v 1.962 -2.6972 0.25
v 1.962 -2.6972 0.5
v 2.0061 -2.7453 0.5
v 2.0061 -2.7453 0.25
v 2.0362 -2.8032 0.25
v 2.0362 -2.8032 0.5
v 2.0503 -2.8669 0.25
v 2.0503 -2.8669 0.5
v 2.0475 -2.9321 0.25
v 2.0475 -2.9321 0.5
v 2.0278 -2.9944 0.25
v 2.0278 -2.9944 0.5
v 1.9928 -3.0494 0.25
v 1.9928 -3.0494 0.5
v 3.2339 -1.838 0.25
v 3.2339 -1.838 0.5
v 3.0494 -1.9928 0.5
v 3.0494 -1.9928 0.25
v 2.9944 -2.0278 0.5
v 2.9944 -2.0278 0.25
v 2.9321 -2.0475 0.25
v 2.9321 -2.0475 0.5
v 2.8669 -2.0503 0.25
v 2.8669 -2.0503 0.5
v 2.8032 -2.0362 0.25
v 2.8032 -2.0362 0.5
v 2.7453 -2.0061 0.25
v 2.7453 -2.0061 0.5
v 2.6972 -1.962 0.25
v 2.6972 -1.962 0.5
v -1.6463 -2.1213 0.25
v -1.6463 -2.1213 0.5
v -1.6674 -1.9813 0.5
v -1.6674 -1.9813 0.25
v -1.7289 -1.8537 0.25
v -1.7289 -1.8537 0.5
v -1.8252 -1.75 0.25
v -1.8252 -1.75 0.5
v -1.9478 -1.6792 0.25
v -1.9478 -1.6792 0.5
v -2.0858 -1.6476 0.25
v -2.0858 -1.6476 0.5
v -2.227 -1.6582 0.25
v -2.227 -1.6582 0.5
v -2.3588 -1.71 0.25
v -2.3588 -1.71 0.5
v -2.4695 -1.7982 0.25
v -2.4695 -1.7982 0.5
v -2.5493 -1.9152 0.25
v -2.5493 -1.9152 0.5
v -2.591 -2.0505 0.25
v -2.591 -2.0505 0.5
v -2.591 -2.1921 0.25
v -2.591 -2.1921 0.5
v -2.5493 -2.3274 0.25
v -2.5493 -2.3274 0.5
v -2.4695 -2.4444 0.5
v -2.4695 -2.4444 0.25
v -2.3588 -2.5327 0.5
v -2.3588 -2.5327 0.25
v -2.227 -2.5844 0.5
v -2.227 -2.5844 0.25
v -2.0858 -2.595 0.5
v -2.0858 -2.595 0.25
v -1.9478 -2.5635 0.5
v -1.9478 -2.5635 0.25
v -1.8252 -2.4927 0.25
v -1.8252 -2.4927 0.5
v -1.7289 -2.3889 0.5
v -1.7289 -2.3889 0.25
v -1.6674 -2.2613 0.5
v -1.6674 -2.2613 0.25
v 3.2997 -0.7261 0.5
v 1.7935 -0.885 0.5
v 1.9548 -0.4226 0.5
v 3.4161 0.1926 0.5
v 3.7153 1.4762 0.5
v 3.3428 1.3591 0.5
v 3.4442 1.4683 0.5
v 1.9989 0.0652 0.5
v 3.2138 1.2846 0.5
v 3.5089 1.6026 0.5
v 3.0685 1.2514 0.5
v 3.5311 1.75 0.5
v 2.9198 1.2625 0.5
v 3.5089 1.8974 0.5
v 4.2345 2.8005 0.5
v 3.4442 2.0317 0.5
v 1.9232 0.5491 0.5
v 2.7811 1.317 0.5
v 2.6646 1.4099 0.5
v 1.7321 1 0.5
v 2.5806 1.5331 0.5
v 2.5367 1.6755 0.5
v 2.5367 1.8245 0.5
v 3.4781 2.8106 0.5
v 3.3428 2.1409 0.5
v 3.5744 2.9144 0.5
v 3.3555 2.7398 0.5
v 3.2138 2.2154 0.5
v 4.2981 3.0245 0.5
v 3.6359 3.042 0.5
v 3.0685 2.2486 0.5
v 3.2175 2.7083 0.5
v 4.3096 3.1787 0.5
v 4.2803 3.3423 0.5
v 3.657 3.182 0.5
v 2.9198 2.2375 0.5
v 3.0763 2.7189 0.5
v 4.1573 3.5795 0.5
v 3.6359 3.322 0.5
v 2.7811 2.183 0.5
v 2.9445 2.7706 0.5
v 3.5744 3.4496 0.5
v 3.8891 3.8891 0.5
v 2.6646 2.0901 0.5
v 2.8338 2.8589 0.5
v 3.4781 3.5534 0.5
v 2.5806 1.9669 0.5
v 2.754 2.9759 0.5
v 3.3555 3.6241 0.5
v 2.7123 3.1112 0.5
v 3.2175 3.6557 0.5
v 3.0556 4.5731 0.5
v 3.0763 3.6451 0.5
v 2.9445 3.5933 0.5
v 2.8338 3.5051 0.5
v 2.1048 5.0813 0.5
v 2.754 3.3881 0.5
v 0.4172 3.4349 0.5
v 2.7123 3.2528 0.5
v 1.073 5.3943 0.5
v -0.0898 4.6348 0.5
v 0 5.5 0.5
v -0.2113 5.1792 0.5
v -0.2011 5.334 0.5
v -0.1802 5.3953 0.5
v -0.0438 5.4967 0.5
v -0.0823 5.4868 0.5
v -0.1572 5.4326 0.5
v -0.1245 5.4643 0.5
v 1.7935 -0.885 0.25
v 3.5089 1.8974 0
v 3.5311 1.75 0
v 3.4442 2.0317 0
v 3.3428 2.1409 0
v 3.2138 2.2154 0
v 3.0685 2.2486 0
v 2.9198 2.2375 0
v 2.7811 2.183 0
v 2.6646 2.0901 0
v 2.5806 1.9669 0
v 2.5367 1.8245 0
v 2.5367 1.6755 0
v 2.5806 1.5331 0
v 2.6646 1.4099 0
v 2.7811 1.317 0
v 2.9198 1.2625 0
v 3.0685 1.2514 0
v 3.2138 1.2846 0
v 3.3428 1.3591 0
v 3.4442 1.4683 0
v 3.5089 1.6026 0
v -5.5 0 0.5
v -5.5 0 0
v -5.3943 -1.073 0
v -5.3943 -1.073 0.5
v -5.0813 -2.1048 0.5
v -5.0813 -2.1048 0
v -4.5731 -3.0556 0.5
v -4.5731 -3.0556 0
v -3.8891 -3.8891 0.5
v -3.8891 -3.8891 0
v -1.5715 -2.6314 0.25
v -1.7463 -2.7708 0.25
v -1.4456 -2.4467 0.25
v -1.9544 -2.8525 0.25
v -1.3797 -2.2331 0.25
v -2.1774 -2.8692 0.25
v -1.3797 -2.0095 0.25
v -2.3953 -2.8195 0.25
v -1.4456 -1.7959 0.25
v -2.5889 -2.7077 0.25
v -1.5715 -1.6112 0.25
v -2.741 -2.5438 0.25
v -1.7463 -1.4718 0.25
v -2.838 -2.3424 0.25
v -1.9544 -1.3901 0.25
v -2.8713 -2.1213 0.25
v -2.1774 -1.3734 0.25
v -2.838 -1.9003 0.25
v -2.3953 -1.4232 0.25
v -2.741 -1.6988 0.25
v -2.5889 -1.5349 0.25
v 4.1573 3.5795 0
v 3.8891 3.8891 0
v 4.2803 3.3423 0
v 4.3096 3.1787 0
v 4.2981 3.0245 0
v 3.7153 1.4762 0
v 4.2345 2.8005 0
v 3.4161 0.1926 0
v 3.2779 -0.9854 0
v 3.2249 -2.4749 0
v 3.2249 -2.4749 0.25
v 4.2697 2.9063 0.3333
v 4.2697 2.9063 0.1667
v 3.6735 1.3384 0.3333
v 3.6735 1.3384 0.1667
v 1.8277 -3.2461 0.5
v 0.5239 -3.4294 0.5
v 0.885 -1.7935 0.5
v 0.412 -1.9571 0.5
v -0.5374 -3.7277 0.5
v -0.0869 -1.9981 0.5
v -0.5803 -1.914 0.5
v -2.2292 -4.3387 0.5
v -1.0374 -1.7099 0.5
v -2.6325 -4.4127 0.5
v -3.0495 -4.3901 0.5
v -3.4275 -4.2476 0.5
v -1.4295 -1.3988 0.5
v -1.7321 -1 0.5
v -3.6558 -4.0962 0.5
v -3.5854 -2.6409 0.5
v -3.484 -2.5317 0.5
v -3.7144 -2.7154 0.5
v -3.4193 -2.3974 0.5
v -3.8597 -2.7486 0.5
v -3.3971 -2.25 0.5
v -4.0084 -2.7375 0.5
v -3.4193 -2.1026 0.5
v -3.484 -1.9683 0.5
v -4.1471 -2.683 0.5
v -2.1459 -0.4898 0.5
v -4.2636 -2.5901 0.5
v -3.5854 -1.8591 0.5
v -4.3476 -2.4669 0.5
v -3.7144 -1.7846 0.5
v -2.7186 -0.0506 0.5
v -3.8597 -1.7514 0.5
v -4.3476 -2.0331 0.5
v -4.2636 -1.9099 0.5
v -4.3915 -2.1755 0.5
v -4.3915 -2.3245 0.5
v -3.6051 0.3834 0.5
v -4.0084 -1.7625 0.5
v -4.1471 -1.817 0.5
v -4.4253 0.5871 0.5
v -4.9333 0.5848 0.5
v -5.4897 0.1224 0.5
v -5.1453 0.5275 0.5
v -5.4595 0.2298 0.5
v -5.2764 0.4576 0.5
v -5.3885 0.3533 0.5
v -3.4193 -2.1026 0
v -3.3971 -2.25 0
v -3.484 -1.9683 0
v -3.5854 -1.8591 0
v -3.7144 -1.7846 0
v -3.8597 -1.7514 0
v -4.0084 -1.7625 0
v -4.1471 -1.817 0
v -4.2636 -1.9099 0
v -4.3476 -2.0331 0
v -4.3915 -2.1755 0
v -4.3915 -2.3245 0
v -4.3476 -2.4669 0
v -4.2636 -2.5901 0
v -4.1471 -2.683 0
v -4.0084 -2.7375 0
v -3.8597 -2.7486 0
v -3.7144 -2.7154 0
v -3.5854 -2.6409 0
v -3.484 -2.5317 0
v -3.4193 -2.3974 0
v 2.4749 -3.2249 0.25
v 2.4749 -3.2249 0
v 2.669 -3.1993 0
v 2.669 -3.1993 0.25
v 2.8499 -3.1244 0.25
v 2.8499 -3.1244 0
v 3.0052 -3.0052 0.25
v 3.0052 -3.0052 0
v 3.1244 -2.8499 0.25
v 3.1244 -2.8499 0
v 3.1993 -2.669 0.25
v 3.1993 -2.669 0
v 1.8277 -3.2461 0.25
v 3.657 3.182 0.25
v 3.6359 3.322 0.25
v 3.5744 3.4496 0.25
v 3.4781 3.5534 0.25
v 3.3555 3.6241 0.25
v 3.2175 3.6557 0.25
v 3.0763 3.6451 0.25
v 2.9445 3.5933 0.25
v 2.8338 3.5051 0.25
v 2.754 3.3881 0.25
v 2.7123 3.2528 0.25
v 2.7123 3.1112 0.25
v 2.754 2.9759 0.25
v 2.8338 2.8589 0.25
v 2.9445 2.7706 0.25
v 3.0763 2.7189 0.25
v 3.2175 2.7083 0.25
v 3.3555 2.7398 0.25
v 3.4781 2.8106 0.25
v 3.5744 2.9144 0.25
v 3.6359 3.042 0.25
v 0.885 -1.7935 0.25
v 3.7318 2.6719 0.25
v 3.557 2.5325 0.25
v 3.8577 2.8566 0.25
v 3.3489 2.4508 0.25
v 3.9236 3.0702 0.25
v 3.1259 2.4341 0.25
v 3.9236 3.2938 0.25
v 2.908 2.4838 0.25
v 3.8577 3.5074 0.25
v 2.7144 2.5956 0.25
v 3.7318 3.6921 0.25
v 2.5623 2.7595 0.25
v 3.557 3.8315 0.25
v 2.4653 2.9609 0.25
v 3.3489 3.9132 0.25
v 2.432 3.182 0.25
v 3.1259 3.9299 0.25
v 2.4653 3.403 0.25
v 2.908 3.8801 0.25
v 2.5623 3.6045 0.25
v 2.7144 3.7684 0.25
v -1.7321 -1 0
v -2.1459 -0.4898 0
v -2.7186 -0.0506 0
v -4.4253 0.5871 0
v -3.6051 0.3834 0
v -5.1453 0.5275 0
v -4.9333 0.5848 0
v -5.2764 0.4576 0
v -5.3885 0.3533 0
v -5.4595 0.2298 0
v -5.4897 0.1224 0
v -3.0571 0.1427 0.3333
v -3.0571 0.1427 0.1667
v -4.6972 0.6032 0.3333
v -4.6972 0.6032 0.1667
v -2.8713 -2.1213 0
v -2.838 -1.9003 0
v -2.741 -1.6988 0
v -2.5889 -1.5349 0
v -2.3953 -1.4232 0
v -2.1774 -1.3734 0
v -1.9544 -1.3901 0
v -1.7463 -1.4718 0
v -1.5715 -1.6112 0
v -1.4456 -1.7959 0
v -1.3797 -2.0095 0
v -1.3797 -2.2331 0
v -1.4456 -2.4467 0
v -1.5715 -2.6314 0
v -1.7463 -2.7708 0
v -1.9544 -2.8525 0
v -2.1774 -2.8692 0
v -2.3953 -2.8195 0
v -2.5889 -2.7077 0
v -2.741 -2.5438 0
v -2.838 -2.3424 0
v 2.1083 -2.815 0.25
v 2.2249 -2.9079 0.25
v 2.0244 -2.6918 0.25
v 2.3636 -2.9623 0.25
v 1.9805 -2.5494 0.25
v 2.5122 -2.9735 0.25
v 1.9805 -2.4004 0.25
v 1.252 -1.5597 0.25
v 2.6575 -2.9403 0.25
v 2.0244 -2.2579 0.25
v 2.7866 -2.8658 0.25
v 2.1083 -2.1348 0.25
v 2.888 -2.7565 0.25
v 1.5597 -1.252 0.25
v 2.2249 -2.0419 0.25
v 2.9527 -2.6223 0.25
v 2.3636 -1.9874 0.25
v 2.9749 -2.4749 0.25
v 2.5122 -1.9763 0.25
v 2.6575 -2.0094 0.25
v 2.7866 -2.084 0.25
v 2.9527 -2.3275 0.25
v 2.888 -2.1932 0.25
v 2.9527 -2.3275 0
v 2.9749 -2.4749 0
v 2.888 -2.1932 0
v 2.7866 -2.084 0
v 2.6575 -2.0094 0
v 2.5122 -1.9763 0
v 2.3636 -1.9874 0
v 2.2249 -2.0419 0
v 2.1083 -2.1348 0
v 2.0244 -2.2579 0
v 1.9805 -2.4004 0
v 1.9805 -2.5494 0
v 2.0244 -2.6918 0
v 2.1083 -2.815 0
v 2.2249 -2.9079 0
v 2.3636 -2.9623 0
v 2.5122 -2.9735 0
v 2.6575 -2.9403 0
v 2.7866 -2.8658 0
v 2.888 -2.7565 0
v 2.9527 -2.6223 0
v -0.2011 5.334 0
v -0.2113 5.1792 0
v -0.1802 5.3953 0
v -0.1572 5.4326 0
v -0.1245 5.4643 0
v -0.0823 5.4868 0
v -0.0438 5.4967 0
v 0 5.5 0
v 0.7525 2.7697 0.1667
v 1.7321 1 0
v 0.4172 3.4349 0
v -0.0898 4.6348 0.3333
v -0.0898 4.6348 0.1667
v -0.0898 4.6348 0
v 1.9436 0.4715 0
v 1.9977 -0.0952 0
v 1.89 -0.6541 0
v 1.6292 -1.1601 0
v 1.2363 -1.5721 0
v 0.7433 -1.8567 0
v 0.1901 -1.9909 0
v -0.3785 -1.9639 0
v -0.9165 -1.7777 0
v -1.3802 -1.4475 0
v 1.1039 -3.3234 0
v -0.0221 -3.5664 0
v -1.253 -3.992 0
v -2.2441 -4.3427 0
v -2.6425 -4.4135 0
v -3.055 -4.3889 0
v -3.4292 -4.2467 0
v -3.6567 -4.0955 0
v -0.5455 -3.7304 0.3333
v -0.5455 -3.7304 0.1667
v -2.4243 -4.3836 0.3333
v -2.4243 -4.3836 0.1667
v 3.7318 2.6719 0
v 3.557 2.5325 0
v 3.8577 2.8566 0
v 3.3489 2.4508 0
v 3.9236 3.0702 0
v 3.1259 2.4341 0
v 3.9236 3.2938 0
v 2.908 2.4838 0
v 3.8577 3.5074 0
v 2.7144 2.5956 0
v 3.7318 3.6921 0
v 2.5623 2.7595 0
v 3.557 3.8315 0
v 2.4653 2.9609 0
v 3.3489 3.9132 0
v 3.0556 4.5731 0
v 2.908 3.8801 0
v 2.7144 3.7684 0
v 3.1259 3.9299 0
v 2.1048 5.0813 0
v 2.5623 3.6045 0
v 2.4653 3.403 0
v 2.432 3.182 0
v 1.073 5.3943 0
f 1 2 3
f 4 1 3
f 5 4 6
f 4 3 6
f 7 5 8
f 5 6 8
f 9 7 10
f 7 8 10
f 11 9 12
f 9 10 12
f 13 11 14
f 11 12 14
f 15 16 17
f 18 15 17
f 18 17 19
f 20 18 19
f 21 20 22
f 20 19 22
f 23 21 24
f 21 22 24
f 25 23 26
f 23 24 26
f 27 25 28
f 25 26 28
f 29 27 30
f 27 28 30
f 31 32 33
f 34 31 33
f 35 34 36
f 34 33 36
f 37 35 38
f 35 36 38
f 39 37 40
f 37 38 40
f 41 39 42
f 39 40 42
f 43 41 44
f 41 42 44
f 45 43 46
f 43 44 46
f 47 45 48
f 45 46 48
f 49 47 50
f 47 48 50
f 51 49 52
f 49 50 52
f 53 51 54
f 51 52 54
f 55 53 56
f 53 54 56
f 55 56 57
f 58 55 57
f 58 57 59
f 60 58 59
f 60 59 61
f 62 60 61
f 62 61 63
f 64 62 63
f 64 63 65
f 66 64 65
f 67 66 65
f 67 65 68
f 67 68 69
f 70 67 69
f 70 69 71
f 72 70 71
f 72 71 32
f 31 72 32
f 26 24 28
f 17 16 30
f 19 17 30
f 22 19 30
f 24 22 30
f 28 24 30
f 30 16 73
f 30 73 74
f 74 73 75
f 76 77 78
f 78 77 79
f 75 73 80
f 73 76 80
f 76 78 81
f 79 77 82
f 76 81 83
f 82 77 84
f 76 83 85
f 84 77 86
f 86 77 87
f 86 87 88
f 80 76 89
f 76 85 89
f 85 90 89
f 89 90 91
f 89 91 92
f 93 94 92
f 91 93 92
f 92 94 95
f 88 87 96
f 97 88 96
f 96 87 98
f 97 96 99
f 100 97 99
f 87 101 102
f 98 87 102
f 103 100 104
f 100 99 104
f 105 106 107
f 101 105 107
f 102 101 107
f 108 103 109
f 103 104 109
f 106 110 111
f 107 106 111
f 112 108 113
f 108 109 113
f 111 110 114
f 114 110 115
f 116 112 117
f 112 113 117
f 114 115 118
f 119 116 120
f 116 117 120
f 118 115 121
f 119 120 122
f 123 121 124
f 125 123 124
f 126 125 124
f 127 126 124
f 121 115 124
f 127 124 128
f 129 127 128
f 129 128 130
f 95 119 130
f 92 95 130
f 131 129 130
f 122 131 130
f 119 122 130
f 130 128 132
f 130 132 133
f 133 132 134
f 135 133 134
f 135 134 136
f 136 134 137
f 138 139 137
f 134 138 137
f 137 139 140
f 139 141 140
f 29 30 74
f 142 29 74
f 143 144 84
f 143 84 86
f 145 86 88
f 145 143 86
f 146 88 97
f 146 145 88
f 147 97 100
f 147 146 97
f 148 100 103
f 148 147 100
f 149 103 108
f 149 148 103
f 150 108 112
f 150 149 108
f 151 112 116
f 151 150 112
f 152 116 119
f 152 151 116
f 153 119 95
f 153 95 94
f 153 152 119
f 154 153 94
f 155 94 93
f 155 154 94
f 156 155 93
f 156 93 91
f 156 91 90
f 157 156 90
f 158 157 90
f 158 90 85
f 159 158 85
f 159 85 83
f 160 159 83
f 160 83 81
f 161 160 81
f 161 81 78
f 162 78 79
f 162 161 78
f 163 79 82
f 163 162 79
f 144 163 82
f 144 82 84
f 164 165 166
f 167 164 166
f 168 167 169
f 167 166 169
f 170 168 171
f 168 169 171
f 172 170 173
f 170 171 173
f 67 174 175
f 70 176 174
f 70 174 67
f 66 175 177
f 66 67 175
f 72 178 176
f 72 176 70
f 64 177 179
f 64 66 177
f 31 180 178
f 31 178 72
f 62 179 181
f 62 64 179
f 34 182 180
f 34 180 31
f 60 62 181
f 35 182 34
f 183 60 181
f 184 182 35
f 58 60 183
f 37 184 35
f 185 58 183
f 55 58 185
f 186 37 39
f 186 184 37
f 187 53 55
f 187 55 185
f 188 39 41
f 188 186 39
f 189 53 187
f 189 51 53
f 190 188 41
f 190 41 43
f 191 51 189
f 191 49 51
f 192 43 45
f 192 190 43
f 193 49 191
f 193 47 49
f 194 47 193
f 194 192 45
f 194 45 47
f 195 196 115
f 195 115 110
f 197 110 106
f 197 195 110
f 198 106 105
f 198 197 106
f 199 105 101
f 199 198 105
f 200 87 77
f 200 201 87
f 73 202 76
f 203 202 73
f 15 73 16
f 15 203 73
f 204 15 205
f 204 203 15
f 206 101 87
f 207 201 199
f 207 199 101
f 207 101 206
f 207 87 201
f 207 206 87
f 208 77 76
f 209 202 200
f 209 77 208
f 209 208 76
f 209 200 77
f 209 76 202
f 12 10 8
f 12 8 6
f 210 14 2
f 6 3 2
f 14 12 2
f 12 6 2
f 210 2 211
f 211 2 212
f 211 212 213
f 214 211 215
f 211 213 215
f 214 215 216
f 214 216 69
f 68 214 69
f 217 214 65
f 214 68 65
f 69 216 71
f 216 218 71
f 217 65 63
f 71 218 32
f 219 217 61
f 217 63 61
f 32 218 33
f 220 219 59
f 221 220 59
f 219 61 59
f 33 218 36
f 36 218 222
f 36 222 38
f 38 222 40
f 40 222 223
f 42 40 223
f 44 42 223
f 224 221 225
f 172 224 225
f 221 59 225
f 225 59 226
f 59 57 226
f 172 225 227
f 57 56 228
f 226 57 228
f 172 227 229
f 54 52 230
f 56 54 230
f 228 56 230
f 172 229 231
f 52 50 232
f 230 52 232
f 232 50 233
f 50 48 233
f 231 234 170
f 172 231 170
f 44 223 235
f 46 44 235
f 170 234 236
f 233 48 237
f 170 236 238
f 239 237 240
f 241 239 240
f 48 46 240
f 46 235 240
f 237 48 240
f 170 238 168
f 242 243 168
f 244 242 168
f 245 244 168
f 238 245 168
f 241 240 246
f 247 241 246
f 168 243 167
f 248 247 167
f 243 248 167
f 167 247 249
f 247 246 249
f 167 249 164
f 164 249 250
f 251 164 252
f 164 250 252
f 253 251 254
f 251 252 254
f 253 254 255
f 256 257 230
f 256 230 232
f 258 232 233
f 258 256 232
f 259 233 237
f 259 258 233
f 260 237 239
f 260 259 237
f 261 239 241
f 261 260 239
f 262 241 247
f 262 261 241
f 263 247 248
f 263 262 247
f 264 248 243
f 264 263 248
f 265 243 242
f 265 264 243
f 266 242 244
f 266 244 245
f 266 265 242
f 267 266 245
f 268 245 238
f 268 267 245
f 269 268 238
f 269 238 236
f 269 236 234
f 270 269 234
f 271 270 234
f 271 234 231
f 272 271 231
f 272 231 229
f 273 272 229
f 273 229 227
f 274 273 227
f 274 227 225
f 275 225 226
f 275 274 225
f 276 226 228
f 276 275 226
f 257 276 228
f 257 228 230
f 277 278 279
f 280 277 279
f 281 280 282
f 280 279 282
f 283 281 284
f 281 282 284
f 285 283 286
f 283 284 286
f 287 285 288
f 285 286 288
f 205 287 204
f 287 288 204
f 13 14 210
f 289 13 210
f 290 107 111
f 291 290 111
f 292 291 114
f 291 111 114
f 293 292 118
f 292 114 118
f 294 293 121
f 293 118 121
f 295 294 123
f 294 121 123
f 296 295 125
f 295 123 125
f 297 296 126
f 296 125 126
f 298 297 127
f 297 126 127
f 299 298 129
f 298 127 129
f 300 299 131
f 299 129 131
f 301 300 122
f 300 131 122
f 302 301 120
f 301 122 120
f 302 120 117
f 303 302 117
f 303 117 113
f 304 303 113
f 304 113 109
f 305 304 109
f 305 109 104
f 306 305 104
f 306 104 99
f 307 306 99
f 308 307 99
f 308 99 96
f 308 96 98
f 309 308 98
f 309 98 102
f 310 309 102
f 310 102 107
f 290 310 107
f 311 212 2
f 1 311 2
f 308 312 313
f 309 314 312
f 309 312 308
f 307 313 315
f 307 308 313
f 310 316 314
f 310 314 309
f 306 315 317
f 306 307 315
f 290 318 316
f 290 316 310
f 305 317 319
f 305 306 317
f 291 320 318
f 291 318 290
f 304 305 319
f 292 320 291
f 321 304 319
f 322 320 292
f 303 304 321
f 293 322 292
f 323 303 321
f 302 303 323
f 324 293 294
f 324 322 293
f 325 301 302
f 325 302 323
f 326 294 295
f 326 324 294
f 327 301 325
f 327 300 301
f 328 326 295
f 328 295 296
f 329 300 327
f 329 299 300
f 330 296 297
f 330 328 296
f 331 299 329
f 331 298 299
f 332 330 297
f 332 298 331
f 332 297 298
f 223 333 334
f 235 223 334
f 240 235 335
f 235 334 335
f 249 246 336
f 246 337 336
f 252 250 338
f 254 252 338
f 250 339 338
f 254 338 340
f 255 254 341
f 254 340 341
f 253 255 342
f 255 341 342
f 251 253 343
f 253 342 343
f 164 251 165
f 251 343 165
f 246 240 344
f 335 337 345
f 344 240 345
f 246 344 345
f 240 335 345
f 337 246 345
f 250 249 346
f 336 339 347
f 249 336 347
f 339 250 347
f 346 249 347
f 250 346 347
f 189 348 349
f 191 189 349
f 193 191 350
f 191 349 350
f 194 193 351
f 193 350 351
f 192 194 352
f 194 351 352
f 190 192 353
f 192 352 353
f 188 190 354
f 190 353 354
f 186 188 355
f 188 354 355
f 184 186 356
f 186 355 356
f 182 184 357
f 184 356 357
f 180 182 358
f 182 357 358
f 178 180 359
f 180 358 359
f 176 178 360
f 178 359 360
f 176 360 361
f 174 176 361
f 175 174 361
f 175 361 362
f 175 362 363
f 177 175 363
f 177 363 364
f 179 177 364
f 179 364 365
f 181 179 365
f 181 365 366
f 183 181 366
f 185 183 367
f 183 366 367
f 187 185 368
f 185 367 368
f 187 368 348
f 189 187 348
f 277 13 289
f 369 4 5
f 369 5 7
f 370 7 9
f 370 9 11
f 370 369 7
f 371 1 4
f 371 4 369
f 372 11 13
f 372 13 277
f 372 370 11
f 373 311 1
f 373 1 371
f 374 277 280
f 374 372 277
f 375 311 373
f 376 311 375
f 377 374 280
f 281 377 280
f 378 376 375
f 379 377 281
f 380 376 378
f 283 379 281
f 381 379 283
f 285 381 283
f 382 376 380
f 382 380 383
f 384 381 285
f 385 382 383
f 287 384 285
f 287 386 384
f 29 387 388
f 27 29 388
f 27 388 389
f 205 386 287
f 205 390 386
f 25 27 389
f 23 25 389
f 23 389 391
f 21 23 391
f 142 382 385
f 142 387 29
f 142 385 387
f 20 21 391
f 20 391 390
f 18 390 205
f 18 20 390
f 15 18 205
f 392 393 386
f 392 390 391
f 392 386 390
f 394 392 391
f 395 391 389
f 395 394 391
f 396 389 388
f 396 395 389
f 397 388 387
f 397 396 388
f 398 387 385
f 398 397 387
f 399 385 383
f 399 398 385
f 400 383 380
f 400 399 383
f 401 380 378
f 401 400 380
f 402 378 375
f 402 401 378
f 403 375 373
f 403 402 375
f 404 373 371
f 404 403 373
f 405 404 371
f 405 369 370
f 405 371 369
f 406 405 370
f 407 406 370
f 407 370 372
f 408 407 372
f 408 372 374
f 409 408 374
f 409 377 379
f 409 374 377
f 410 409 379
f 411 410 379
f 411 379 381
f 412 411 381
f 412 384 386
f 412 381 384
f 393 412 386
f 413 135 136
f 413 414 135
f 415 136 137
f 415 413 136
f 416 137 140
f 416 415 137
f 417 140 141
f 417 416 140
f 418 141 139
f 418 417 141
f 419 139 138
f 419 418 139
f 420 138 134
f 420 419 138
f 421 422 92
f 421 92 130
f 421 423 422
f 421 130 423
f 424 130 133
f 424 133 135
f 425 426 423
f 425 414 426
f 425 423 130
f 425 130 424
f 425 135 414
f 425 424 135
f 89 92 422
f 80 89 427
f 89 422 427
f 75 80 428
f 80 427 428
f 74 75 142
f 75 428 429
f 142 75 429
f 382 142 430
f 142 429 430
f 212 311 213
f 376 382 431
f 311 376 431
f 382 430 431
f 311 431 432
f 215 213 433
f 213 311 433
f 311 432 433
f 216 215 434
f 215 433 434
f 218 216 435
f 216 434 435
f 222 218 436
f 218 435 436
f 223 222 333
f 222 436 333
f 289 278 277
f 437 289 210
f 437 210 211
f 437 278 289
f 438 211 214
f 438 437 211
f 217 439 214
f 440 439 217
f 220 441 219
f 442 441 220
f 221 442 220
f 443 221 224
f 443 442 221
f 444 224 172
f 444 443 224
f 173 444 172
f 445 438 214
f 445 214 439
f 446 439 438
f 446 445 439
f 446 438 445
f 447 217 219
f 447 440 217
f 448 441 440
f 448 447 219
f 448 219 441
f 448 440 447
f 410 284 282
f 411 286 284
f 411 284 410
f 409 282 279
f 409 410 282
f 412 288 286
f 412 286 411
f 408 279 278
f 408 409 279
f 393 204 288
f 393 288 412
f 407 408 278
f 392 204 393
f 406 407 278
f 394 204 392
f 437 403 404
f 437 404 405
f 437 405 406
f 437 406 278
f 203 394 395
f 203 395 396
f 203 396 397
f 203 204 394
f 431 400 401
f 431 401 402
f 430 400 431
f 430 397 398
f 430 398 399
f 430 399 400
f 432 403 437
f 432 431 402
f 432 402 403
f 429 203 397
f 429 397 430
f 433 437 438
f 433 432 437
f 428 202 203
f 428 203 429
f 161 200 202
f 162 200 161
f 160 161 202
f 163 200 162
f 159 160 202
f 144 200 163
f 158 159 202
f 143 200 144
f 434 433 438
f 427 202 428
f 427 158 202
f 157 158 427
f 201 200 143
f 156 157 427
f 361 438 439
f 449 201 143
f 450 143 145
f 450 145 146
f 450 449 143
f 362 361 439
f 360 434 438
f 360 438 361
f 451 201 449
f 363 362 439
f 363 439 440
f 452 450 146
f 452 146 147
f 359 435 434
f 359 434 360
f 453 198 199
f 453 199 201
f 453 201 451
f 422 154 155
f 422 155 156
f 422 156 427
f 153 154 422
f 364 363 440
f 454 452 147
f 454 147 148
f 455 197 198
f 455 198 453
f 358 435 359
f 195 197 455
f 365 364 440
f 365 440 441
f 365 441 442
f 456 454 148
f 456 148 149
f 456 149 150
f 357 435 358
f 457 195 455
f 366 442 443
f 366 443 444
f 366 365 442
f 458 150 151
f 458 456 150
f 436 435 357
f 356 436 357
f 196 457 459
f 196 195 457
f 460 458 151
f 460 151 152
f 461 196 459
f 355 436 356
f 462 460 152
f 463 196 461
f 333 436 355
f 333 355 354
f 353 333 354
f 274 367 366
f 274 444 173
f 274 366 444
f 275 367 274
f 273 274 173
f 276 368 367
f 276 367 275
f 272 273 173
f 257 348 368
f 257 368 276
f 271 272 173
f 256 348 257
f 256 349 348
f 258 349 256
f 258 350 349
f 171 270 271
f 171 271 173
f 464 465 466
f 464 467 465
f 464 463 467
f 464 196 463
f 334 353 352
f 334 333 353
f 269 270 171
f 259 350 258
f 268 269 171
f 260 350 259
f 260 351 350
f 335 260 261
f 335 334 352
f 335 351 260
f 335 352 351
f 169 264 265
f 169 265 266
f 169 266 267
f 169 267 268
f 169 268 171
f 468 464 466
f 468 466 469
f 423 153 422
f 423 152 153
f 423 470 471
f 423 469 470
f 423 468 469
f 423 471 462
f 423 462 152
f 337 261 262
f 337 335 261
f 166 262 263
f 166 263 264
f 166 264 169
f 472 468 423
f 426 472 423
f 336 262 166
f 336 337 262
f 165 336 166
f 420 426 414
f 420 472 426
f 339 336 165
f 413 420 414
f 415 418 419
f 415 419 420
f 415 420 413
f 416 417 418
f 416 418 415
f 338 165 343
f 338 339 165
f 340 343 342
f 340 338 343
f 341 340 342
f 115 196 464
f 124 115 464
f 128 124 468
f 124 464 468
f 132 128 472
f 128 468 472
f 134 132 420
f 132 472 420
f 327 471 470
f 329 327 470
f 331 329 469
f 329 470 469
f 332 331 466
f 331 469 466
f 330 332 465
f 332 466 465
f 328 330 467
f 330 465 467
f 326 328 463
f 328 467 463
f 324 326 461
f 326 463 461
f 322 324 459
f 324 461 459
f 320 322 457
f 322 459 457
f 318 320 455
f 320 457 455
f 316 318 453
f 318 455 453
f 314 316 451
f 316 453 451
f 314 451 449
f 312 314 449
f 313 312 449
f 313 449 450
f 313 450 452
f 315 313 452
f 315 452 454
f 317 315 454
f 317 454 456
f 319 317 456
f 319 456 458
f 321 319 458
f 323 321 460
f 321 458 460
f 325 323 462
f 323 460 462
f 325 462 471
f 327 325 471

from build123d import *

# Parameters (mm, degrees)
CROQUIS1_R                   = 0.5
SALIENTE_EXTRUIR1_DEPTH      = 0.5
CROQUIS3_R                   = 0.75
CORTAR_EXTRUIR1_DEPTH        = 0.25
CORTAR_EXTRUIR2_DEPTH        = 0.25
TALADRO_ROSCADO_M1_2X0_251_D = 0.95


with BuildPart() as part:
    # Croquis1 → Saliente-Extruir1 (new body)
    with BuildSketch(Plane.XY):
        with BuildLine():
            add(Edge.make_bspline(
                [(3.889087297, 3.889087297), (5.132893433, 2.64528116), (3.224873734, 3.014627212), (3.224873734, -2.474873734)],
                knots=[0, 0, 0, 0, 0.763896924, 0.763896924, 0.763896924, 0.763896924], degree=3))
            ThreePointArc((3.889087297, 3.889087297), (2.104758878, 5.081337429), (0, 5.5))
            add(Edge.make_bspline(
                [(1.732050808, 1), (0.948721344, 2.35676643), (-0.820788378, 5.5), (0, 5.5)],
                knots=[0, 0, 0, 0, 1, 1, 1, 1], degree=3))
            ThreePointArc((1.732050808, 1), (1, -1.732050808), (-1.732050808, -1))
            add(Edge.make_bspline(
                [(-1.732050808, -1), (-2.515380271, 0.35676643), (-5.5, 1.262116296), (-5.5, 0)],
                knots=[0, 0, 0, 0, 1, 1, 1, 1], degree=3))
            ThreePointArc((-5.5, 0), (-5.081337429, -2.104758878), (-3.889087297, -3.889087297))
            add(Edge.make_bspline(
                [(2.474873734, -3.224873734), (-1.35865781, -3.224873734), (-2.388951019, -5.389223574), (-3.889087297, -3.889087297)],
                knots=[0, 0, 0, 0, 1, 1, 1, 1], degree=3))
            ThreePointArc((2.474873734, -3.224873734), (3.00520382, -3.00520382), (3.224873734, -2.474873734))
        make_face()
        with Locations((-3.897114317, -2.25)):
            Circle(CROQUIS1_R, mode=Mode.SUBTRACT)
        with Locations((2.474873734, -2.474873734)):
            Circle(CROQUIS1_R, mode=Mode.SUBTRACT)
        with Locations((3.031088913, 1.75)):
            Circle(CROQUIS1_R, mode=Mode.SUBTRACT)
    extrude(amount=SALIENTE_EXTRUIR1_DEPTH)

    # Croquis3 → Cortar-Extruir1 (cut)
    with BuildSketch(Plane(origin=(0, 0, 0), x_dir=(-1, 0, 0), z_dir=(0, 0, -1))):
        with Locations((-3.181980515, 3.181980515)):
            Circle(CROQUIS3_R)
        with Locations((2.121320344, -2.121320344)):
            Circle(CROQUIS3_R)
    extrude(amount=-CORTAR_EXTRUIR1_DEPTH, mode=Mode.SUBTRACT)

    # Croquis4 → Cortar-Extruir2 (cut)
    with BuildSketch(Plane.XY.offset(0.5)):
        with BuildLine():
            Line((2.697199053, -1.961968819), (1.793528827, -0.88501658))
            ThreePointArc((1.793528827, -0.88501658), (1.414213562, -1.414213562), (0.88501658, -1.793528827))
            Line((0.88501658, -1.793528827), (1.961968819, -2.697199053))
            ThreePointArc((1.961968819, -2.697199053), (2.050320591, -2.866921228), (1.992783027, -3.049407066))
            Line((1.992783027, -3.049407066), (1.827745002, -3.246091726))
            add(Edge.make_bspline(
                [(2.474873734, -3.224873734), (2.249714916, -3.224873734), (2.034226396, -3.232340066), (1.827745002, -3.246091726)],
                knots=[0, 0, 0, 0, 0.058734046, 0.058734046, 0.058734046, 0.058734046], degree=3))
            ThreePointArc((2.474873734, -3.224873734), (3.00520382, -3.00520382), (3.224873734, -2.474873734))
            add(Edge.make_bspline(
                [(3.233875287, -1.837995811), (3.227985327, -2.041061917), (3.224873734, -2.253190531), (3.224873734, -2.474873734)],
                knots=[0.733048379, 0.733048379, 0.733048379, 0.733048379, 0.763896924, 0.763896924, 0.763896924, 0.763896924], degree=3))
            Line((3.233875287, -1.837995811), (3.049407066, -1.992783027))
            ThreePointArc((3.049407066, -1.992783027), (2.866921228, -2.050320591), (2.697199053, -1.961968819))
        make_face()
    extrude(amount=-CORTAR_EXTRUIR2_DEPTH, mode=Mode.SUBTRACT)

    # Taladro roscado M1.2x0.251 (through all)
    with Locations(Plane(origin=(0, 0, 0.25), x_dir=(-1, 0, 0), z_dir=(0, 0, -1))):
        with Locations((2.121320344, -2.121320344), (-3.181980515, 3.181980515)):
            Hole(TALADRO_ROSCADO_M1_2X0_251_D / 2)


solid = part.part
